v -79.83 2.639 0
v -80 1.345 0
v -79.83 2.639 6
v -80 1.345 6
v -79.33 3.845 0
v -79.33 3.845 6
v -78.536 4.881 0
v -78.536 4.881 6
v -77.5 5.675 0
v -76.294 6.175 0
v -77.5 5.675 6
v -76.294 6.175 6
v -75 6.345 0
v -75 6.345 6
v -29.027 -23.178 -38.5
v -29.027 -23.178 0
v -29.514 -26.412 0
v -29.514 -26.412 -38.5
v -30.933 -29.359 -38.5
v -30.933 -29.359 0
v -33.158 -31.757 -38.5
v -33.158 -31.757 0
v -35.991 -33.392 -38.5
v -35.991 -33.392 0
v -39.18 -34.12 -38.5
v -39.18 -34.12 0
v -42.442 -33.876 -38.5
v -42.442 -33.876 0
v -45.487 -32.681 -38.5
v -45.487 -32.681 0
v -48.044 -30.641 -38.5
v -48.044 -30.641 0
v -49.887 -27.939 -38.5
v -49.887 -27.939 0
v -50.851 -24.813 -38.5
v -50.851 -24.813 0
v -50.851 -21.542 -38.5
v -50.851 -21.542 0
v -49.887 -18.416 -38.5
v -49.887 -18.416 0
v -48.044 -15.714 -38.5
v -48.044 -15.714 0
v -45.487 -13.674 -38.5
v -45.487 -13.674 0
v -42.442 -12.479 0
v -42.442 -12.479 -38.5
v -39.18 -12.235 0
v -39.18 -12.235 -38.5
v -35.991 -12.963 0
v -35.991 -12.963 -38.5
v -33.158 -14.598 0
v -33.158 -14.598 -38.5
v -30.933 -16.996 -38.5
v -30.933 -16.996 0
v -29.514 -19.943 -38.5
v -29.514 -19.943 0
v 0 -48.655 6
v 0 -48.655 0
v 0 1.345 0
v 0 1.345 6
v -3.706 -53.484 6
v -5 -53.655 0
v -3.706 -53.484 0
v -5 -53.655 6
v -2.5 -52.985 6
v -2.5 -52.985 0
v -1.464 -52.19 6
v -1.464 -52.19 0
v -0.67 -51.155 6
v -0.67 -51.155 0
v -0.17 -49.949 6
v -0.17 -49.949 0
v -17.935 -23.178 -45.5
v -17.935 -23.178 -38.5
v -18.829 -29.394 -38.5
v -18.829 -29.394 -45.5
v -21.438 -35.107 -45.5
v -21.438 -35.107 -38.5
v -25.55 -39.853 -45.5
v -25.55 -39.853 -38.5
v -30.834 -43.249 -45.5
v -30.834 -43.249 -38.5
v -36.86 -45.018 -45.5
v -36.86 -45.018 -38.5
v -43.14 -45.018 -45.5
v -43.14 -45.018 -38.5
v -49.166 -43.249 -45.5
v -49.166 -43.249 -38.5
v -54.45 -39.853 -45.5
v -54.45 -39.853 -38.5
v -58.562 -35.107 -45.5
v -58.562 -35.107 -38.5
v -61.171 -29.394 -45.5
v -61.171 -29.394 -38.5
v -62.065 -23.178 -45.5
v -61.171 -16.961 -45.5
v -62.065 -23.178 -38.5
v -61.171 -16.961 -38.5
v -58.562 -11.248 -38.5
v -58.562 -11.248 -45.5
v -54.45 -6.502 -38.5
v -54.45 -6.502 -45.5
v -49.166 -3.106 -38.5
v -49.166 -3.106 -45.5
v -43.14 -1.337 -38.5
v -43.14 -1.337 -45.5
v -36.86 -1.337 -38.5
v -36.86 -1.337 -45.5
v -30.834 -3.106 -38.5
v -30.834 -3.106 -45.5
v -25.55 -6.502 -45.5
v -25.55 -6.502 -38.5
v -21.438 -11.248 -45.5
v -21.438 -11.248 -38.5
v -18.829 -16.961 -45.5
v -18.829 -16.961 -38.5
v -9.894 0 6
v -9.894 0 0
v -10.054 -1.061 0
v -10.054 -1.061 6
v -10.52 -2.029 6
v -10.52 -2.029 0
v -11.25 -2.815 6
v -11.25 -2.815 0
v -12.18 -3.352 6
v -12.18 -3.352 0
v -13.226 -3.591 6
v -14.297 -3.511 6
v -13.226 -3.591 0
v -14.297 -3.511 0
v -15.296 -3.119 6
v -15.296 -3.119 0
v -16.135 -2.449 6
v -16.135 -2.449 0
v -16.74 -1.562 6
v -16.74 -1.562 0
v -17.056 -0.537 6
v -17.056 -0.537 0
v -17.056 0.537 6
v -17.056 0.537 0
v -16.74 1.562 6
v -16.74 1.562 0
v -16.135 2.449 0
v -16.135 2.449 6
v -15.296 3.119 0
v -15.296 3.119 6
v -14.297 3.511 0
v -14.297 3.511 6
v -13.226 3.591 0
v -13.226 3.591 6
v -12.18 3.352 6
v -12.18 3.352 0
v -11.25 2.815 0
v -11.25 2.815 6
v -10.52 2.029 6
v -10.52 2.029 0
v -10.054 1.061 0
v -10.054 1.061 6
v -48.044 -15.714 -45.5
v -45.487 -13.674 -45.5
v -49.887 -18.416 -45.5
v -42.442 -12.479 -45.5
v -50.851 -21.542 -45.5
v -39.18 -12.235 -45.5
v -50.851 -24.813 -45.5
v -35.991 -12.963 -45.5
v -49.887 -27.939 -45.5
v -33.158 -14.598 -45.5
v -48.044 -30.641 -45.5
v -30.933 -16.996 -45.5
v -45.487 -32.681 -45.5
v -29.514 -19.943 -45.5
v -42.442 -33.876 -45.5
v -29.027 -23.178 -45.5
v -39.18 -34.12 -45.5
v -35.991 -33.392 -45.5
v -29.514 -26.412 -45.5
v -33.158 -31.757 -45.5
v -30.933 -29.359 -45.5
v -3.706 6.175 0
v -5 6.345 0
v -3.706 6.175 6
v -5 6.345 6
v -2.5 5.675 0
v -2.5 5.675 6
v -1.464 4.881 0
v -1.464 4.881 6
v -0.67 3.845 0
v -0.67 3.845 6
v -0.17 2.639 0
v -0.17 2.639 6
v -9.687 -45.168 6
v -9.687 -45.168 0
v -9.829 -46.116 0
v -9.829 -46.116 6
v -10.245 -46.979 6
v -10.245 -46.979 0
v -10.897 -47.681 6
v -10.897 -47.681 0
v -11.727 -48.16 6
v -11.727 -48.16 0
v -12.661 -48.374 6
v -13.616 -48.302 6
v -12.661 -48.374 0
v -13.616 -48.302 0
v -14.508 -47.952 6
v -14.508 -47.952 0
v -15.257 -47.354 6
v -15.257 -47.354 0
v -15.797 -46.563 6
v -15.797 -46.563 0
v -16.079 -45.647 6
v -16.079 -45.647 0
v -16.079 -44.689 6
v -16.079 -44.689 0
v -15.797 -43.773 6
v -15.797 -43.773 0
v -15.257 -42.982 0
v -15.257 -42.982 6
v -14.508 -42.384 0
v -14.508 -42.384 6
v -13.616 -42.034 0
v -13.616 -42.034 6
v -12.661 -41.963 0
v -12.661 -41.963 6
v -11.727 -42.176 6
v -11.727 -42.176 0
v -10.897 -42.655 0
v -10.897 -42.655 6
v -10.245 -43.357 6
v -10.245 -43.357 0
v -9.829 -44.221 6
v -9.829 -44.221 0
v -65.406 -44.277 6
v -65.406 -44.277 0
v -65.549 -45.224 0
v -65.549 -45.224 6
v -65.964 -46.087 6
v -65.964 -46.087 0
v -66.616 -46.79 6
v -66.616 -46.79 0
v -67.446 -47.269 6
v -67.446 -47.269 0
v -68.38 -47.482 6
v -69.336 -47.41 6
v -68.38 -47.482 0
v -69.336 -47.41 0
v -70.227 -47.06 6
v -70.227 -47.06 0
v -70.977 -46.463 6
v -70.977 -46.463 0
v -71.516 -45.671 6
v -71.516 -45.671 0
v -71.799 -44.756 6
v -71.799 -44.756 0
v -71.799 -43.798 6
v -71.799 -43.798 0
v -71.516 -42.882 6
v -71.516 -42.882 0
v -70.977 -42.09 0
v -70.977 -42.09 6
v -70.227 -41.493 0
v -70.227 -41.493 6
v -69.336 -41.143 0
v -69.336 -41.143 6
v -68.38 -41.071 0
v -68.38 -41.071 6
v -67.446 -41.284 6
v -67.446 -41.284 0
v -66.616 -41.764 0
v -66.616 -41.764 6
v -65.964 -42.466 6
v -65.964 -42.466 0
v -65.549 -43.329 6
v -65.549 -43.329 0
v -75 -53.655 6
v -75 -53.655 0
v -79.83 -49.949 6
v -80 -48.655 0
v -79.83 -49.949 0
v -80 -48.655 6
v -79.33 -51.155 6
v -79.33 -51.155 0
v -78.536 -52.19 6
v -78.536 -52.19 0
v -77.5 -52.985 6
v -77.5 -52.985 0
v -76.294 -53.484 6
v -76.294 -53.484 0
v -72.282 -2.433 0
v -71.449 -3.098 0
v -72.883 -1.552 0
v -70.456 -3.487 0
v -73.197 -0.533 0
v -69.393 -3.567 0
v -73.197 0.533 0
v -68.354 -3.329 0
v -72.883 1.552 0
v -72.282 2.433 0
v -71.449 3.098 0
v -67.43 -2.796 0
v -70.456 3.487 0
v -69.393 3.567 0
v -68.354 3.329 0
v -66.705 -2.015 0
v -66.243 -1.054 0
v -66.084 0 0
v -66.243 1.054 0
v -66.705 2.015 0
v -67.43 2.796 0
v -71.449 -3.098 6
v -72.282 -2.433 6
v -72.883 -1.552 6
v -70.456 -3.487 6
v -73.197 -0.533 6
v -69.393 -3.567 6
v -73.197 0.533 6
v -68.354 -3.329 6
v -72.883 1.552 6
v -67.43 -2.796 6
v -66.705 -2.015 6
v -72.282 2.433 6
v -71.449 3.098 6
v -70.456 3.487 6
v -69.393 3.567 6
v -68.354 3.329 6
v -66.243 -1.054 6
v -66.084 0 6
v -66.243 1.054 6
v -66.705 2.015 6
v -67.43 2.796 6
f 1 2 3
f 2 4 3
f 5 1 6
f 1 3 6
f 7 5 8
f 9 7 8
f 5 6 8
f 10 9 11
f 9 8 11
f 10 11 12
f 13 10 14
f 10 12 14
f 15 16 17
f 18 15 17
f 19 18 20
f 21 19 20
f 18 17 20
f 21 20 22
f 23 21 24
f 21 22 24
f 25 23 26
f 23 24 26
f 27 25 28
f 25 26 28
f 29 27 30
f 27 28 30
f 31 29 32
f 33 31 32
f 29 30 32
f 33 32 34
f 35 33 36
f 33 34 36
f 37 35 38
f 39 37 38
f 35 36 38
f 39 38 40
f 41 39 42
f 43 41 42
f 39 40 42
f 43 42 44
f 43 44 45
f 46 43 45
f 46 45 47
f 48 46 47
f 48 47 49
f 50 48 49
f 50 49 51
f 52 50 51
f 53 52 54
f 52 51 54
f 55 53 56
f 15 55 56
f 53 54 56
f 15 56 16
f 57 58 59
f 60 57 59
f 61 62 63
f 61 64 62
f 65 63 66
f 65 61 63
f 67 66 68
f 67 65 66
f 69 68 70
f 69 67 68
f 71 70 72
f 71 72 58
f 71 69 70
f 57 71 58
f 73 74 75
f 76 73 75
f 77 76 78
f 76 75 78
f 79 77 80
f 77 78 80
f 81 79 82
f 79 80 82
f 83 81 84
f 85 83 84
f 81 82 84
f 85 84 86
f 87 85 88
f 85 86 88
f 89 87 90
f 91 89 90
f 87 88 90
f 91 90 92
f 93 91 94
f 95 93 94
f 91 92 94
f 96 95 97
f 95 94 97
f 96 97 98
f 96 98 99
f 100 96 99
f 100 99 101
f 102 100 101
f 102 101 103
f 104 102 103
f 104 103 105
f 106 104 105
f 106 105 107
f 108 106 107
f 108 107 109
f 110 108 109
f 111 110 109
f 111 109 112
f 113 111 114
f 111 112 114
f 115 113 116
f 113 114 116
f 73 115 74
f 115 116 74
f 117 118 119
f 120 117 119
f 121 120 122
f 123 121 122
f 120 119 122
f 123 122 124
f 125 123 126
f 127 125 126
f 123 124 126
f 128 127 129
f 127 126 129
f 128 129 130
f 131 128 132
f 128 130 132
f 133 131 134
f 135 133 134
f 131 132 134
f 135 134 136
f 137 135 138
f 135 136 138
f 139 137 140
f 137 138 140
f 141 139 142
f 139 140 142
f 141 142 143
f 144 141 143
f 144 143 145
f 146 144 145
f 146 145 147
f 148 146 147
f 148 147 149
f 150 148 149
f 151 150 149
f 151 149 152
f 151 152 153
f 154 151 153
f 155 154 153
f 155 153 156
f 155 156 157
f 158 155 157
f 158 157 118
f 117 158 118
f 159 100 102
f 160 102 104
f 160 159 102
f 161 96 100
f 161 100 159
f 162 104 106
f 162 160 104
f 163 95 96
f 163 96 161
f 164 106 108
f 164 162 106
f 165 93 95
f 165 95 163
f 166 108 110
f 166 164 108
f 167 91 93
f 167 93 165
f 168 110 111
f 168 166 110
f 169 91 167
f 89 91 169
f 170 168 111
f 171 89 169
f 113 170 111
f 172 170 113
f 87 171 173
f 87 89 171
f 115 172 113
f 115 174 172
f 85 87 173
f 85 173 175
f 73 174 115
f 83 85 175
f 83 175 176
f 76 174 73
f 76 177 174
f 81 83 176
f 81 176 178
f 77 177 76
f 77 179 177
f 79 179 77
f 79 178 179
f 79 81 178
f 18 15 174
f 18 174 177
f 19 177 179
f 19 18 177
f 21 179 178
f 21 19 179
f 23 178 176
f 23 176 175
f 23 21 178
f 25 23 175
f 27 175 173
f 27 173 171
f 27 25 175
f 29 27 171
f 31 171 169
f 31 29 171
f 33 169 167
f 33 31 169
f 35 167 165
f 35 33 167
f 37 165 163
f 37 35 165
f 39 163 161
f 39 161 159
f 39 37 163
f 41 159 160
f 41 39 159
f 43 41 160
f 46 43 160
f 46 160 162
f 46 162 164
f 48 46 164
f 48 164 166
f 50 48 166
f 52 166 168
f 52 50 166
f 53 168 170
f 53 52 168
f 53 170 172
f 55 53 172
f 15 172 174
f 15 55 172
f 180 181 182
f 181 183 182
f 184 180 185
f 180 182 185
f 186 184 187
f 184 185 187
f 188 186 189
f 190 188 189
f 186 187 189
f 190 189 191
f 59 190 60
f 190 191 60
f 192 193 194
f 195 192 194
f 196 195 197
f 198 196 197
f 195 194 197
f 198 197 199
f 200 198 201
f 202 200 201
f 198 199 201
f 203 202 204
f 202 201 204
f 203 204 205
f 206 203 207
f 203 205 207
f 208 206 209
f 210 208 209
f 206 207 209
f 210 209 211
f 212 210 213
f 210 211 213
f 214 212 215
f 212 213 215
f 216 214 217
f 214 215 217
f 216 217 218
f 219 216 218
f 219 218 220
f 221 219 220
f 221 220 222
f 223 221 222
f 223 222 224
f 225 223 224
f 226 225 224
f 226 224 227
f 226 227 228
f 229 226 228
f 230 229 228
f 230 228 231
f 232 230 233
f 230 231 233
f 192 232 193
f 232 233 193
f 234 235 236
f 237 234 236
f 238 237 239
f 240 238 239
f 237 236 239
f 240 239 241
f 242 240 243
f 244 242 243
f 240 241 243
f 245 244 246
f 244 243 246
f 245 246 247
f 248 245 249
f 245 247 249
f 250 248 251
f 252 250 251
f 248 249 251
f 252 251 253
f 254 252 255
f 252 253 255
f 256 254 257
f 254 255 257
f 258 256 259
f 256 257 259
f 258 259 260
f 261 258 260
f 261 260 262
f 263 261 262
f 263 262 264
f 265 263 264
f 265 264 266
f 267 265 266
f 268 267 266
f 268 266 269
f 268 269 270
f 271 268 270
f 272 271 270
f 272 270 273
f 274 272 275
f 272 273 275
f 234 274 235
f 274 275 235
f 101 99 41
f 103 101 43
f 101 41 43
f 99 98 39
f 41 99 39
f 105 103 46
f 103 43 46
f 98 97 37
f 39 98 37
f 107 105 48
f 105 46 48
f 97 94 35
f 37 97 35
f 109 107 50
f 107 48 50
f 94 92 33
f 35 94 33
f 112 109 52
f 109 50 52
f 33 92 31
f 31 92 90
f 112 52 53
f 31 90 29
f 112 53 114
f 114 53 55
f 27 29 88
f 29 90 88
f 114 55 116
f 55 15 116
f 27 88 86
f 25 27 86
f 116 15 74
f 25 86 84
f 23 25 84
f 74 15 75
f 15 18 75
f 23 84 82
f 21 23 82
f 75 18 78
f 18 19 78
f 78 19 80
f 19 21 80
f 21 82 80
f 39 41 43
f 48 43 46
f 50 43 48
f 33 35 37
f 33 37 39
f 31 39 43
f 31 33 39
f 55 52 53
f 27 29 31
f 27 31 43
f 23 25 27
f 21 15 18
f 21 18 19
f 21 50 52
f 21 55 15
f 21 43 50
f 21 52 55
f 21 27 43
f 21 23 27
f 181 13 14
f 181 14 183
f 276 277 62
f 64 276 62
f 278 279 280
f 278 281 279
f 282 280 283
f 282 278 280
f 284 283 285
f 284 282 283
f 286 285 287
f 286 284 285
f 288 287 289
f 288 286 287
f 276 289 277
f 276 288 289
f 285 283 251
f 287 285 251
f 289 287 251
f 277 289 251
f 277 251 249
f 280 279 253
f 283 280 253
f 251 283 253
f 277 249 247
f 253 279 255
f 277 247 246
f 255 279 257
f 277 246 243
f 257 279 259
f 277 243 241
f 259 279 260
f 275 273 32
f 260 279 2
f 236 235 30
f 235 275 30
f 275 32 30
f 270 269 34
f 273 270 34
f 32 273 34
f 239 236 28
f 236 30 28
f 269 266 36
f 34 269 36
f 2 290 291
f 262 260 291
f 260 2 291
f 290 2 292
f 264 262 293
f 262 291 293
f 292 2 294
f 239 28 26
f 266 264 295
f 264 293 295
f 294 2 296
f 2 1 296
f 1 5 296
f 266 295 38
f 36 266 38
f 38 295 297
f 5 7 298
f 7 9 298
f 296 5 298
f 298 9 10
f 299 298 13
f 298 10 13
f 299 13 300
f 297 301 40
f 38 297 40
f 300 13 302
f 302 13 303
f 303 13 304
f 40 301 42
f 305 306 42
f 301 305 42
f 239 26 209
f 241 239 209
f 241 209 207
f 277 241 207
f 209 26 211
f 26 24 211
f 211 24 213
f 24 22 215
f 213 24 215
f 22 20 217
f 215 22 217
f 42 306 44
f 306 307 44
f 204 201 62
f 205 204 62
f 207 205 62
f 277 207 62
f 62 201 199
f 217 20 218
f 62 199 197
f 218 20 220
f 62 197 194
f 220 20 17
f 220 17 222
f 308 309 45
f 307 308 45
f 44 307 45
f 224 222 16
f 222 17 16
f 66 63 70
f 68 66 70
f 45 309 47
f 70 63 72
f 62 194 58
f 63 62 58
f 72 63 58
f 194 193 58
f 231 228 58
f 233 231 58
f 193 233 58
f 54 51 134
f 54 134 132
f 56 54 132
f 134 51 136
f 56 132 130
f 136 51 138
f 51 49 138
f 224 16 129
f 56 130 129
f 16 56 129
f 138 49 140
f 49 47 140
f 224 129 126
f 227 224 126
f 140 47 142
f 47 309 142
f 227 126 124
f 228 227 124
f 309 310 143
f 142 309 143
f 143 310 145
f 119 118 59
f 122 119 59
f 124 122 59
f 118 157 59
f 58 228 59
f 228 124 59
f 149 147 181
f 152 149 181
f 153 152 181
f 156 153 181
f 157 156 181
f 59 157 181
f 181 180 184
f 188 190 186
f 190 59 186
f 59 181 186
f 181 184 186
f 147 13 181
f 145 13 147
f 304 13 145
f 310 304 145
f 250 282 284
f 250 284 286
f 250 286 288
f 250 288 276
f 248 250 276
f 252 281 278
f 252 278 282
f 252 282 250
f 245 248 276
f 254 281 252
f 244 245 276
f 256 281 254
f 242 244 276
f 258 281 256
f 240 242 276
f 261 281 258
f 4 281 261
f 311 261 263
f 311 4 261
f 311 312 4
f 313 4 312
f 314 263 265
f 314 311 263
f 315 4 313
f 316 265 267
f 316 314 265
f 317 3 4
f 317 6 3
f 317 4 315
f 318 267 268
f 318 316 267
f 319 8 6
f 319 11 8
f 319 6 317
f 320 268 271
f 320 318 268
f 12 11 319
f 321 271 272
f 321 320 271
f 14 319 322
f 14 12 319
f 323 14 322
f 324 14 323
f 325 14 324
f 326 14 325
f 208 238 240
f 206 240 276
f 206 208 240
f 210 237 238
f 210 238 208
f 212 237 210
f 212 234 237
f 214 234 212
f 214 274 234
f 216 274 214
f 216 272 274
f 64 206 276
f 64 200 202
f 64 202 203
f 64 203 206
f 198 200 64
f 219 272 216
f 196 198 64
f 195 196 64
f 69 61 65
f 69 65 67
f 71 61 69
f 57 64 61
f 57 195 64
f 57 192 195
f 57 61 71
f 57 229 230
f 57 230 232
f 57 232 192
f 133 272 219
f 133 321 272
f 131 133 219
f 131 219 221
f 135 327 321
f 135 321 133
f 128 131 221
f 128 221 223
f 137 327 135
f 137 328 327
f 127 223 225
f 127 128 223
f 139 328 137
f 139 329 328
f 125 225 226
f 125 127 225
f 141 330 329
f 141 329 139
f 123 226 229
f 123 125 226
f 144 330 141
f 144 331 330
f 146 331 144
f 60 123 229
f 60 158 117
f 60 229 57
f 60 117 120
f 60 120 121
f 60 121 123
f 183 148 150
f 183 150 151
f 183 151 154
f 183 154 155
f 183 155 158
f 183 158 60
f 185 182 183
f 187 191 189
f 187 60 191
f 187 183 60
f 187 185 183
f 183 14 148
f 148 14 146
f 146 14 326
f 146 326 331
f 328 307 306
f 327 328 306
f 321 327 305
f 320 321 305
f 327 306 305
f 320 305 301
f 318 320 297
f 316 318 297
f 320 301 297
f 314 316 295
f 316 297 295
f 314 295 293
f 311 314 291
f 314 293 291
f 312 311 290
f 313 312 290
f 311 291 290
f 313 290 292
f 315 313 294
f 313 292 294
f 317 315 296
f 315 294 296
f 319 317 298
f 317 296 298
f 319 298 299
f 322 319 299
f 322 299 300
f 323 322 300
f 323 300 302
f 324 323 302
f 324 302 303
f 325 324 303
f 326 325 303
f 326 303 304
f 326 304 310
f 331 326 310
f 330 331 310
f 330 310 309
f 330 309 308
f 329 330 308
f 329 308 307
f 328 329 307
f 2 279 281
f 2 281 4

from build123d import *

# Parameters (mm, degrees)
F0_W      = 80
F0_H      = 60
F1_DEPTH  = 6
F2_R      = 5
F3_R      = 5
F4_R      = 10.973416
F5_DEPTH  = 38.5
F6_R      = 22.06519
F6_R_2    = 10.973416
F7_DEPTH  = 7
F8_R      = 3.214383
F9_DEPTH  = 6
F10_R     = 3.60115
F11_DEPTH = 6.001
F12_R     = 3.576715
F13_DEPTH = 6.001


with BuildPart() as f1:
    # F0 (on Top) → F1 (new body)
    with BuildSketch(Plane.XY):
        with Locations((-40, -23.654647)):
            Rectangle(F0_W, F0_H)
    extrude(amount=F1_DEPTH)

    # F2
    f2_edges = [f1.edges().sort_by_distance(p)[0] for p in [
        (-80, -53.654647, 3),
    ]]
    fillet(f2_edges, radius=F2_R)

    # F3
    f3_edges = [f1.edges().sort_by_distance(p)[0] for p in [
        (-80, 6.345353, 3),
        (0, 6.345353, 3),
        (0, -53.654647, 3),
    ]]
    fillet(f3_edges, radius=F3_R)

    # F4 (on face) → F5 (join)
    with BuildSketch(Plane(origin=(0, 0, 0), x_dir=(1, 0, 0), z_dir=(0, 0, -1))):
        with Locations((-40, 23.177557)):
            Circle(F4_R)
    extrude(amount=F5_DEPTH)

    # F8 (on face) → F9 (cut, through all)
    with BuildSketch(Plane(origin=(0, 0, 0), x_dir=(1, 0, 0), z_dir=(0, 0, -1))):
        with Locations((-68.620282, 44.27662)):
            Circle(F8_R)
        with Locations((-12.900943, 45.168126)):
            Circle(F8_R)
    extrude(amount=-F9_DEPTH, mode=Mode.SUBTRACT)

    # F10 (on face) → F11 (cut, through all)
    with BuildSketch(Plane(origin=(0, 0, 0), x_dir=(1, 0, 0), z_dir=(0, 0, -1))):
        with Locations((-13.495281, 0)):
            Circle(F10_R)
    extrude(amount=-F11_DEPTH, mode=Mode.SUBTRACT)

    # F12 (on face) → F13 (cut, through all)
    with BuildSketch(Plane(origin=(0, 0, 0), x_dir=(1, 0, 0), z_dir=(0, 0, -1))):
        with Locations((-69.66038, 0)):
            Circle(F12_R)
    extrude(amount=-F13_DEPTH, mode=Mode.SUBTRACT)


with BuildPart() as f7:
    # F6 (on face) → F7 (new body)
    with BuildSketch(Plane(origin=(0, 0, -38.5), x_dir=(1, 0, 0), z_dir=(0, 0, -1))):
        with Locations((-40, 23.177557)):
            Circle(F6_R)
        with Locations((-40, 23.177557)):
            Circle(F6_R_2, mode=Mode.SUBTRACT)
    extrude(amount=F7_DEPTH)


solid = Compound([f1.part, f7.part])
